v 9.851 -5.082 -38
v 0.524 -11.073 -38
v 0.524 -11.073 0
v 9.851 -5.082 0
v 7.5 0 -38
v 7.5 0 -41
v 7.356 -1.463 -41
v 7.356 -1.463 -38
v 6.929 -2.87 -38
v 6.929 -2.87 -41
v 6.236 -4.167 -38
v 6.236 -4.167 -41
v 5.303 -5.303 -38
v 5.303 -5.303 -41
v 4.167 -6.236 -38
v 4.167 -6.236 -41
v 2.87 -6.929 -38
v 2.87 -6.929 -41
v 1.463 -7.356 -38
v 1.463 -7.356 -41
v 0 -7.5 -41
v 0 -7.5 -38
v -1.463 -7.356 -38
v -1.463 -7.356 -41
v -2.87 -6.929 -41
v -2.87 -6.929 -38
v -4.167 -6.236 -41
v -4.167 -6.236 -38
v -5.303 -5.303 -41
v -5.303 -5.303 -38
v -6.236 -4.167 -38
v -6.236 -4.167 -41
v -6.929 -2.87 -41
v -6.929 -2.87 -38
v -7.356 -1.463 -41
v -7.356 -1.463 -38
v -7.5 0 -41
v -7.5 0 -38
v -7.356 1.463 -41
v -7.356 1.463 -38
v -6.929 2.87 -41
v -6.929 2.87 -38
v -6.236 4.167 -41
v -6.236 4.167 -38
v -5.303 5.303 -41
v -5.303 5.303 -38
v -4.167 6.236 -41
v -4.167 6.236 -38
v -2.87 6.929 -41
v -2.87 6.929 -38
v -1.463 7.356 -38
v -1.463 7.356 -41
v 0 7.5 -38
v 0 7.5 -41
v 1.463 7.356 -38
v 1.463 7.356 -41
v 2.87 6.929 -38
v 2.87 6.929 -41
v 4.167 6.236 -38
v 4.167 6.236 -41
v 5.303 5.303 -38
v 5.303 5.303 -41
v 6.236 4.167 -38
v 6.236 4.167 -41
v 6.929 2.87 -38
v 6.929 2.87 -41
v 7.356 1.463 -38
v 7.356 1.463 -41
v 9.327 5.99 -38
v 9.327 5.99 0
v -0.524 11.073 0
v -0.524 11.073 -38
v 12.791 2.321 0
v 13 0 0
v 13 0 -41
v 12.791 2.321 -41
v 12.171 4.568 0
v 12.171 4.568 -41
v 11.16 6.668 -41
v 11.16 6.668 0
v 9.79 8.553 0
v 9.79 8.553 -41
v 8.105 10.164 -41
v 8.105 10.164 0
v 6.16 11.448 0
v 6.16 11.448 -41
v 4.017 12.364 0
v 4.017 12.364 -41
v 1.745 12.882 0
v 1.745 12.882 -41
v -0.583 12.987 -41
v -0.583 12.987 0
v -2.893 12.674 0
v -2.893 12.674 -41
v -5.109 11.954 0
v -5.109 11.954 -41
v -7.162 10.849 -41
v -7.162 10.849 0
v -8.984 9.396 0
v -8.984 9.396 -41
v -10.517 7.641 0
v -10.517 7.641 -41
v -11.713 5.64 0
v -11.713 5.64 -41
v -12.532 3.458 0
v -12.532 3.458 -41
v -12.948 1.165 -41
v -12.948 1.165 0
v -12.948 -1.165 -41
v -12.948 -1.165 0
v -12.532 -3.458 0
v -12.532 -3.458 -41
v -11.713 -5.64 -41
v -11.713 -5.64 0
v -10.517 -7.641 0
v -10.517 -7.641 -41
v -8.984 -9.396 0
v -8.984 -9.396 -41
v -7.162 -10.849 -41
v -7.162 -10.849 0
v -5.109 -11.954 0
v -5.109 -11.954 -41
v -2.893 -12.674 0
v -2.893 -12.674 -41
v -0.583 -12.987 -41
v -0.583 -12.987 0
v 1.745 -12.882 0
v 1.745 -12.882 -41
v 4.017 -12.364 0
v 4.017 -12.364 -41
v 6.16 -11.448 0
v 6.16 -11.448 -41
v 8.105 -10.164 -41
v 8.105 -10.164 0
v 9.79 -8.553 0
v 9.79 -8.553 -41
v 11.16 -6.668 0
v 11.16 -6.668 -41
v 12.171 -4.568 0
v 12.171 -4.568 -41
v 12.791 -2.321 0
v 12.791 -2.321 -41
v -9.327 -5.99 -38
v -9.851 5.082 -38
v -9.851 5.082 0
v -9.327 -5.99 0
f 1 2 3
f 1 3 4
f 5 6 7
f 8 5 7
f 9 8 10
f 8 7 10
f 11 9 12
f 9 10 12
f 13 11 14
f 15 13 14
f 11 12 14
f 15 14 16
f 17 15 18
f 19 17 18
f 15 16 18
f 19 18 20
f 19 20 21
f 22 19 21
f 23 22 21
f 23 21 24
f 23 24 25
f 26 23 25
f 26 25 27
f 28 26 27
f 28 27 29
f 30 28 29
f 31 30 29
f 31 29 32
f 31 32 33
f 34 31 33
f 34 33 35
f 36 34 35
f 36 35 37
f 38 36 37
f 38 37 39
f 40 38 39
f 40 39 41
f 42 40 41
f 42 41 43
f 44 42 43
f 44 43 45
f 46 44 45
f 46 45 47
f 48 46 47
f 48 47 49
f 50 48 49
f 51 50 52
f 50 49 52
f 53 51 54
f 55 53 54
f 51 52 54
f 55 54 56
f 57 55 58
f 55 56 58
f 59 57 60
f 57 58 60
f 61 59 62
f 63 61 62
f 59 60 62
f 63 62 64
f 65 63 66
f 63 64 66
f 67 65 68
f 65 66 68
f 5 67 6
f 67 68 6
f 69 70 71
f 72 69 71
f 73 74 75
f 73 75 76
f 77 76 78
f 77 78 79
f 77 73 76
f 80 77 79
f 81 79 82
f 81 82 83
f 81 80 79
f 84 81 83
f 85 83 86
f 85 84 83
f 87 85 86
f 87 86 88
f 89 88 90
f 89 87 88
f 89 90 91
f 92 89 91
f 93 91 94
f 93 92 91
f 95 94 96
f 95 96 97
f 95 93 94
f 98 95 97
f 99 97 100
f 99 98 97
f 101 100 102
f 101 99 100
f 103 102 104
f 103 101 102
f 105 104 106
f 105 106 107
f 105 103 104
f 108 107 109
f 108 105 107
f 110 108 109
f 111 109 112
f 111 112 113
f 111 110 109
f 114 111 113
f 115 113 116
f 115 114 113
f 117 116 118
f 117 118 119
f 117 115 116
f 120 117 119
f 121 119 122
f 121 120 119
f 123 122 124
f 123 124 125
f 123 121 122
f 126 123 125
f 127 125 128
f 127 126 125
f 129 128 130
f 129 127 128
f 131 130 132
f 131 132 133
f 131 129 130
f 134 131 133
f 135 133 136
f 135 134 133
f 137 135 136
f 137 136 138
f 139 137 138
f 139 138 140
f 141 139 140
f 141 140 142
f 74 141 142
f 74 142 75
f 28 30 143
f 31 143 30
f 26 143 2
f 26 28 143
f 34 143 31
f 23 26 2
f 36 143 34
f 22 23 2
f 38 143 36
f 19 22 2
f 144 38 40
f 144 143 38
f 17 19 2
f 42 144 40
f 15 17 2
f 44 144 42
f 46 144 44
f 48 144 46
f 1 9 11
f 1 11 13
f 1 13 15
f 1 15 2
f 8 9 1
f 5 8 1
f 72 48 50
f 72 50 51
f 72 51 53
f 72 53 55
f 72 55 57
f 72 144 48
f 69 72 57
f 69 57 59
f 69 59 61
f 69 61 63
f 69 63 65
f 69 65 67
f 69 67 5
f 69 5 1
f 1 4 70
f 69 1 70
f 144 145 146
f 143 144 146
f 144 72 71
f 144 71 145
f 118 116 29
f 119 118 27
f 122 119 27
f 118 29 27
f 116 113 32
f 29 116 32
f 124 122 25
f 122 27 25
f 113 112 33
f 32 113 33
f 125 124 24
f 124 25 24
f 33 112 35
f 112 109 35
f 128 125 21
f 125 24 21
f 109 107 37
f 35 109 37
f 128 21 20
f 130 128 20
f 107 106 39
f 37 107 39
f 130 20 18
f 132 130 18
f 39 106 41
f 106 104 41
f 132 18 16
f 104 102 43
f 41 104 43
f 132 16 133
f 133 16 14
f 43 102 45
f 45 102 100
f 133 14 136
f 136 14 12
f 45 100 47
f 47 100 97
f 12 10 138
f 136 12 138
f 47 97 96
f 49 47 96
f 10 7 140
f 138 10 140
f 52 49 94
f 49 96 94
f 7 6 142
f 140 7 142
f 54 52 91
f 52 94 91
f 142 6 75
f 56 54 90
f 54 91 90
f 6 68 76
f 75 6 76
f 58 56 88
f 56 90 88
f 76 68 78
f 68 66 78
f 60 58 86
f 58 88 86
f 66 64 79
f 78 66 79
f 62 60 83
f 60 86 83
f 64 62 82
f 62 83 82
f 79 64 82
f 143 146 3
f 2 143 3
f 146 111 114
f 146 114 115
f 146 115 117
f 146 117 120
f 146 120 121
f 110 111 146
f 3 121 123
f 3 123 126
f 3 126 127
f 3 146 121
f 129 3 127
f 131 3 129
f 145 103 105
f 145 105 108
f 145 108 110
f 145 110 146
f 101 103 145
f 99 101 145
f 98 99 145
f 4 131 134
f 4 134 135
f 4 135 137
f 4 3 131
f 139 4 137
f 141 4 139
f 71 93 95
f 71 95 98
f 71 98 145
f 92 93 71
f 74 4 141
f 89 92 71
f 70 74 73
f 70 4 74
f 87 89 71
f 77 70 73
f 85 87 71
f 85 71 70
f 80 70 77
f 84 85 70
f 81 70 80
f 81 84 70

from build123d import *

# Parameters (mm, degrees)
F1_R     = 13
F2_DEPTH = 41
F3_DEPTH = 38
F4_R     = 7.5
F5_DEPTH = 25


with BuildPart() as f2:
    # F1 (on Top) → F2 (new body)
    with BuildSketch(Plane.XY):
        Circle(F1_R)
    extrude(amount=-F2_DEPTH)

    # F0 (on Top) → F3 (cut)
    with BuildSketch(Plane.XY):
        Polygon((-0.524238, 11.072722), (-9.851377, 5.082358), (-9.32714, -5.990364), (0.524238, -11.072722), (9.851377, -5.082358), (9.32714, 5.990364), align=None)
    extrude(amount=-F3_DEPTH, mode=Mode.SUBTRACT)

    # F4 (on face) → F5 (cut)
    with BuildSketch(Plane(origin=(0, 0, -41), x_dir=(1, 0, 0), z_dir=(0, 0, -1))):
        Circle(F4_R)
    extrude(amount=-F5_DEPTH, mode=Mode.SUBTRACT)


solid = f2.part
